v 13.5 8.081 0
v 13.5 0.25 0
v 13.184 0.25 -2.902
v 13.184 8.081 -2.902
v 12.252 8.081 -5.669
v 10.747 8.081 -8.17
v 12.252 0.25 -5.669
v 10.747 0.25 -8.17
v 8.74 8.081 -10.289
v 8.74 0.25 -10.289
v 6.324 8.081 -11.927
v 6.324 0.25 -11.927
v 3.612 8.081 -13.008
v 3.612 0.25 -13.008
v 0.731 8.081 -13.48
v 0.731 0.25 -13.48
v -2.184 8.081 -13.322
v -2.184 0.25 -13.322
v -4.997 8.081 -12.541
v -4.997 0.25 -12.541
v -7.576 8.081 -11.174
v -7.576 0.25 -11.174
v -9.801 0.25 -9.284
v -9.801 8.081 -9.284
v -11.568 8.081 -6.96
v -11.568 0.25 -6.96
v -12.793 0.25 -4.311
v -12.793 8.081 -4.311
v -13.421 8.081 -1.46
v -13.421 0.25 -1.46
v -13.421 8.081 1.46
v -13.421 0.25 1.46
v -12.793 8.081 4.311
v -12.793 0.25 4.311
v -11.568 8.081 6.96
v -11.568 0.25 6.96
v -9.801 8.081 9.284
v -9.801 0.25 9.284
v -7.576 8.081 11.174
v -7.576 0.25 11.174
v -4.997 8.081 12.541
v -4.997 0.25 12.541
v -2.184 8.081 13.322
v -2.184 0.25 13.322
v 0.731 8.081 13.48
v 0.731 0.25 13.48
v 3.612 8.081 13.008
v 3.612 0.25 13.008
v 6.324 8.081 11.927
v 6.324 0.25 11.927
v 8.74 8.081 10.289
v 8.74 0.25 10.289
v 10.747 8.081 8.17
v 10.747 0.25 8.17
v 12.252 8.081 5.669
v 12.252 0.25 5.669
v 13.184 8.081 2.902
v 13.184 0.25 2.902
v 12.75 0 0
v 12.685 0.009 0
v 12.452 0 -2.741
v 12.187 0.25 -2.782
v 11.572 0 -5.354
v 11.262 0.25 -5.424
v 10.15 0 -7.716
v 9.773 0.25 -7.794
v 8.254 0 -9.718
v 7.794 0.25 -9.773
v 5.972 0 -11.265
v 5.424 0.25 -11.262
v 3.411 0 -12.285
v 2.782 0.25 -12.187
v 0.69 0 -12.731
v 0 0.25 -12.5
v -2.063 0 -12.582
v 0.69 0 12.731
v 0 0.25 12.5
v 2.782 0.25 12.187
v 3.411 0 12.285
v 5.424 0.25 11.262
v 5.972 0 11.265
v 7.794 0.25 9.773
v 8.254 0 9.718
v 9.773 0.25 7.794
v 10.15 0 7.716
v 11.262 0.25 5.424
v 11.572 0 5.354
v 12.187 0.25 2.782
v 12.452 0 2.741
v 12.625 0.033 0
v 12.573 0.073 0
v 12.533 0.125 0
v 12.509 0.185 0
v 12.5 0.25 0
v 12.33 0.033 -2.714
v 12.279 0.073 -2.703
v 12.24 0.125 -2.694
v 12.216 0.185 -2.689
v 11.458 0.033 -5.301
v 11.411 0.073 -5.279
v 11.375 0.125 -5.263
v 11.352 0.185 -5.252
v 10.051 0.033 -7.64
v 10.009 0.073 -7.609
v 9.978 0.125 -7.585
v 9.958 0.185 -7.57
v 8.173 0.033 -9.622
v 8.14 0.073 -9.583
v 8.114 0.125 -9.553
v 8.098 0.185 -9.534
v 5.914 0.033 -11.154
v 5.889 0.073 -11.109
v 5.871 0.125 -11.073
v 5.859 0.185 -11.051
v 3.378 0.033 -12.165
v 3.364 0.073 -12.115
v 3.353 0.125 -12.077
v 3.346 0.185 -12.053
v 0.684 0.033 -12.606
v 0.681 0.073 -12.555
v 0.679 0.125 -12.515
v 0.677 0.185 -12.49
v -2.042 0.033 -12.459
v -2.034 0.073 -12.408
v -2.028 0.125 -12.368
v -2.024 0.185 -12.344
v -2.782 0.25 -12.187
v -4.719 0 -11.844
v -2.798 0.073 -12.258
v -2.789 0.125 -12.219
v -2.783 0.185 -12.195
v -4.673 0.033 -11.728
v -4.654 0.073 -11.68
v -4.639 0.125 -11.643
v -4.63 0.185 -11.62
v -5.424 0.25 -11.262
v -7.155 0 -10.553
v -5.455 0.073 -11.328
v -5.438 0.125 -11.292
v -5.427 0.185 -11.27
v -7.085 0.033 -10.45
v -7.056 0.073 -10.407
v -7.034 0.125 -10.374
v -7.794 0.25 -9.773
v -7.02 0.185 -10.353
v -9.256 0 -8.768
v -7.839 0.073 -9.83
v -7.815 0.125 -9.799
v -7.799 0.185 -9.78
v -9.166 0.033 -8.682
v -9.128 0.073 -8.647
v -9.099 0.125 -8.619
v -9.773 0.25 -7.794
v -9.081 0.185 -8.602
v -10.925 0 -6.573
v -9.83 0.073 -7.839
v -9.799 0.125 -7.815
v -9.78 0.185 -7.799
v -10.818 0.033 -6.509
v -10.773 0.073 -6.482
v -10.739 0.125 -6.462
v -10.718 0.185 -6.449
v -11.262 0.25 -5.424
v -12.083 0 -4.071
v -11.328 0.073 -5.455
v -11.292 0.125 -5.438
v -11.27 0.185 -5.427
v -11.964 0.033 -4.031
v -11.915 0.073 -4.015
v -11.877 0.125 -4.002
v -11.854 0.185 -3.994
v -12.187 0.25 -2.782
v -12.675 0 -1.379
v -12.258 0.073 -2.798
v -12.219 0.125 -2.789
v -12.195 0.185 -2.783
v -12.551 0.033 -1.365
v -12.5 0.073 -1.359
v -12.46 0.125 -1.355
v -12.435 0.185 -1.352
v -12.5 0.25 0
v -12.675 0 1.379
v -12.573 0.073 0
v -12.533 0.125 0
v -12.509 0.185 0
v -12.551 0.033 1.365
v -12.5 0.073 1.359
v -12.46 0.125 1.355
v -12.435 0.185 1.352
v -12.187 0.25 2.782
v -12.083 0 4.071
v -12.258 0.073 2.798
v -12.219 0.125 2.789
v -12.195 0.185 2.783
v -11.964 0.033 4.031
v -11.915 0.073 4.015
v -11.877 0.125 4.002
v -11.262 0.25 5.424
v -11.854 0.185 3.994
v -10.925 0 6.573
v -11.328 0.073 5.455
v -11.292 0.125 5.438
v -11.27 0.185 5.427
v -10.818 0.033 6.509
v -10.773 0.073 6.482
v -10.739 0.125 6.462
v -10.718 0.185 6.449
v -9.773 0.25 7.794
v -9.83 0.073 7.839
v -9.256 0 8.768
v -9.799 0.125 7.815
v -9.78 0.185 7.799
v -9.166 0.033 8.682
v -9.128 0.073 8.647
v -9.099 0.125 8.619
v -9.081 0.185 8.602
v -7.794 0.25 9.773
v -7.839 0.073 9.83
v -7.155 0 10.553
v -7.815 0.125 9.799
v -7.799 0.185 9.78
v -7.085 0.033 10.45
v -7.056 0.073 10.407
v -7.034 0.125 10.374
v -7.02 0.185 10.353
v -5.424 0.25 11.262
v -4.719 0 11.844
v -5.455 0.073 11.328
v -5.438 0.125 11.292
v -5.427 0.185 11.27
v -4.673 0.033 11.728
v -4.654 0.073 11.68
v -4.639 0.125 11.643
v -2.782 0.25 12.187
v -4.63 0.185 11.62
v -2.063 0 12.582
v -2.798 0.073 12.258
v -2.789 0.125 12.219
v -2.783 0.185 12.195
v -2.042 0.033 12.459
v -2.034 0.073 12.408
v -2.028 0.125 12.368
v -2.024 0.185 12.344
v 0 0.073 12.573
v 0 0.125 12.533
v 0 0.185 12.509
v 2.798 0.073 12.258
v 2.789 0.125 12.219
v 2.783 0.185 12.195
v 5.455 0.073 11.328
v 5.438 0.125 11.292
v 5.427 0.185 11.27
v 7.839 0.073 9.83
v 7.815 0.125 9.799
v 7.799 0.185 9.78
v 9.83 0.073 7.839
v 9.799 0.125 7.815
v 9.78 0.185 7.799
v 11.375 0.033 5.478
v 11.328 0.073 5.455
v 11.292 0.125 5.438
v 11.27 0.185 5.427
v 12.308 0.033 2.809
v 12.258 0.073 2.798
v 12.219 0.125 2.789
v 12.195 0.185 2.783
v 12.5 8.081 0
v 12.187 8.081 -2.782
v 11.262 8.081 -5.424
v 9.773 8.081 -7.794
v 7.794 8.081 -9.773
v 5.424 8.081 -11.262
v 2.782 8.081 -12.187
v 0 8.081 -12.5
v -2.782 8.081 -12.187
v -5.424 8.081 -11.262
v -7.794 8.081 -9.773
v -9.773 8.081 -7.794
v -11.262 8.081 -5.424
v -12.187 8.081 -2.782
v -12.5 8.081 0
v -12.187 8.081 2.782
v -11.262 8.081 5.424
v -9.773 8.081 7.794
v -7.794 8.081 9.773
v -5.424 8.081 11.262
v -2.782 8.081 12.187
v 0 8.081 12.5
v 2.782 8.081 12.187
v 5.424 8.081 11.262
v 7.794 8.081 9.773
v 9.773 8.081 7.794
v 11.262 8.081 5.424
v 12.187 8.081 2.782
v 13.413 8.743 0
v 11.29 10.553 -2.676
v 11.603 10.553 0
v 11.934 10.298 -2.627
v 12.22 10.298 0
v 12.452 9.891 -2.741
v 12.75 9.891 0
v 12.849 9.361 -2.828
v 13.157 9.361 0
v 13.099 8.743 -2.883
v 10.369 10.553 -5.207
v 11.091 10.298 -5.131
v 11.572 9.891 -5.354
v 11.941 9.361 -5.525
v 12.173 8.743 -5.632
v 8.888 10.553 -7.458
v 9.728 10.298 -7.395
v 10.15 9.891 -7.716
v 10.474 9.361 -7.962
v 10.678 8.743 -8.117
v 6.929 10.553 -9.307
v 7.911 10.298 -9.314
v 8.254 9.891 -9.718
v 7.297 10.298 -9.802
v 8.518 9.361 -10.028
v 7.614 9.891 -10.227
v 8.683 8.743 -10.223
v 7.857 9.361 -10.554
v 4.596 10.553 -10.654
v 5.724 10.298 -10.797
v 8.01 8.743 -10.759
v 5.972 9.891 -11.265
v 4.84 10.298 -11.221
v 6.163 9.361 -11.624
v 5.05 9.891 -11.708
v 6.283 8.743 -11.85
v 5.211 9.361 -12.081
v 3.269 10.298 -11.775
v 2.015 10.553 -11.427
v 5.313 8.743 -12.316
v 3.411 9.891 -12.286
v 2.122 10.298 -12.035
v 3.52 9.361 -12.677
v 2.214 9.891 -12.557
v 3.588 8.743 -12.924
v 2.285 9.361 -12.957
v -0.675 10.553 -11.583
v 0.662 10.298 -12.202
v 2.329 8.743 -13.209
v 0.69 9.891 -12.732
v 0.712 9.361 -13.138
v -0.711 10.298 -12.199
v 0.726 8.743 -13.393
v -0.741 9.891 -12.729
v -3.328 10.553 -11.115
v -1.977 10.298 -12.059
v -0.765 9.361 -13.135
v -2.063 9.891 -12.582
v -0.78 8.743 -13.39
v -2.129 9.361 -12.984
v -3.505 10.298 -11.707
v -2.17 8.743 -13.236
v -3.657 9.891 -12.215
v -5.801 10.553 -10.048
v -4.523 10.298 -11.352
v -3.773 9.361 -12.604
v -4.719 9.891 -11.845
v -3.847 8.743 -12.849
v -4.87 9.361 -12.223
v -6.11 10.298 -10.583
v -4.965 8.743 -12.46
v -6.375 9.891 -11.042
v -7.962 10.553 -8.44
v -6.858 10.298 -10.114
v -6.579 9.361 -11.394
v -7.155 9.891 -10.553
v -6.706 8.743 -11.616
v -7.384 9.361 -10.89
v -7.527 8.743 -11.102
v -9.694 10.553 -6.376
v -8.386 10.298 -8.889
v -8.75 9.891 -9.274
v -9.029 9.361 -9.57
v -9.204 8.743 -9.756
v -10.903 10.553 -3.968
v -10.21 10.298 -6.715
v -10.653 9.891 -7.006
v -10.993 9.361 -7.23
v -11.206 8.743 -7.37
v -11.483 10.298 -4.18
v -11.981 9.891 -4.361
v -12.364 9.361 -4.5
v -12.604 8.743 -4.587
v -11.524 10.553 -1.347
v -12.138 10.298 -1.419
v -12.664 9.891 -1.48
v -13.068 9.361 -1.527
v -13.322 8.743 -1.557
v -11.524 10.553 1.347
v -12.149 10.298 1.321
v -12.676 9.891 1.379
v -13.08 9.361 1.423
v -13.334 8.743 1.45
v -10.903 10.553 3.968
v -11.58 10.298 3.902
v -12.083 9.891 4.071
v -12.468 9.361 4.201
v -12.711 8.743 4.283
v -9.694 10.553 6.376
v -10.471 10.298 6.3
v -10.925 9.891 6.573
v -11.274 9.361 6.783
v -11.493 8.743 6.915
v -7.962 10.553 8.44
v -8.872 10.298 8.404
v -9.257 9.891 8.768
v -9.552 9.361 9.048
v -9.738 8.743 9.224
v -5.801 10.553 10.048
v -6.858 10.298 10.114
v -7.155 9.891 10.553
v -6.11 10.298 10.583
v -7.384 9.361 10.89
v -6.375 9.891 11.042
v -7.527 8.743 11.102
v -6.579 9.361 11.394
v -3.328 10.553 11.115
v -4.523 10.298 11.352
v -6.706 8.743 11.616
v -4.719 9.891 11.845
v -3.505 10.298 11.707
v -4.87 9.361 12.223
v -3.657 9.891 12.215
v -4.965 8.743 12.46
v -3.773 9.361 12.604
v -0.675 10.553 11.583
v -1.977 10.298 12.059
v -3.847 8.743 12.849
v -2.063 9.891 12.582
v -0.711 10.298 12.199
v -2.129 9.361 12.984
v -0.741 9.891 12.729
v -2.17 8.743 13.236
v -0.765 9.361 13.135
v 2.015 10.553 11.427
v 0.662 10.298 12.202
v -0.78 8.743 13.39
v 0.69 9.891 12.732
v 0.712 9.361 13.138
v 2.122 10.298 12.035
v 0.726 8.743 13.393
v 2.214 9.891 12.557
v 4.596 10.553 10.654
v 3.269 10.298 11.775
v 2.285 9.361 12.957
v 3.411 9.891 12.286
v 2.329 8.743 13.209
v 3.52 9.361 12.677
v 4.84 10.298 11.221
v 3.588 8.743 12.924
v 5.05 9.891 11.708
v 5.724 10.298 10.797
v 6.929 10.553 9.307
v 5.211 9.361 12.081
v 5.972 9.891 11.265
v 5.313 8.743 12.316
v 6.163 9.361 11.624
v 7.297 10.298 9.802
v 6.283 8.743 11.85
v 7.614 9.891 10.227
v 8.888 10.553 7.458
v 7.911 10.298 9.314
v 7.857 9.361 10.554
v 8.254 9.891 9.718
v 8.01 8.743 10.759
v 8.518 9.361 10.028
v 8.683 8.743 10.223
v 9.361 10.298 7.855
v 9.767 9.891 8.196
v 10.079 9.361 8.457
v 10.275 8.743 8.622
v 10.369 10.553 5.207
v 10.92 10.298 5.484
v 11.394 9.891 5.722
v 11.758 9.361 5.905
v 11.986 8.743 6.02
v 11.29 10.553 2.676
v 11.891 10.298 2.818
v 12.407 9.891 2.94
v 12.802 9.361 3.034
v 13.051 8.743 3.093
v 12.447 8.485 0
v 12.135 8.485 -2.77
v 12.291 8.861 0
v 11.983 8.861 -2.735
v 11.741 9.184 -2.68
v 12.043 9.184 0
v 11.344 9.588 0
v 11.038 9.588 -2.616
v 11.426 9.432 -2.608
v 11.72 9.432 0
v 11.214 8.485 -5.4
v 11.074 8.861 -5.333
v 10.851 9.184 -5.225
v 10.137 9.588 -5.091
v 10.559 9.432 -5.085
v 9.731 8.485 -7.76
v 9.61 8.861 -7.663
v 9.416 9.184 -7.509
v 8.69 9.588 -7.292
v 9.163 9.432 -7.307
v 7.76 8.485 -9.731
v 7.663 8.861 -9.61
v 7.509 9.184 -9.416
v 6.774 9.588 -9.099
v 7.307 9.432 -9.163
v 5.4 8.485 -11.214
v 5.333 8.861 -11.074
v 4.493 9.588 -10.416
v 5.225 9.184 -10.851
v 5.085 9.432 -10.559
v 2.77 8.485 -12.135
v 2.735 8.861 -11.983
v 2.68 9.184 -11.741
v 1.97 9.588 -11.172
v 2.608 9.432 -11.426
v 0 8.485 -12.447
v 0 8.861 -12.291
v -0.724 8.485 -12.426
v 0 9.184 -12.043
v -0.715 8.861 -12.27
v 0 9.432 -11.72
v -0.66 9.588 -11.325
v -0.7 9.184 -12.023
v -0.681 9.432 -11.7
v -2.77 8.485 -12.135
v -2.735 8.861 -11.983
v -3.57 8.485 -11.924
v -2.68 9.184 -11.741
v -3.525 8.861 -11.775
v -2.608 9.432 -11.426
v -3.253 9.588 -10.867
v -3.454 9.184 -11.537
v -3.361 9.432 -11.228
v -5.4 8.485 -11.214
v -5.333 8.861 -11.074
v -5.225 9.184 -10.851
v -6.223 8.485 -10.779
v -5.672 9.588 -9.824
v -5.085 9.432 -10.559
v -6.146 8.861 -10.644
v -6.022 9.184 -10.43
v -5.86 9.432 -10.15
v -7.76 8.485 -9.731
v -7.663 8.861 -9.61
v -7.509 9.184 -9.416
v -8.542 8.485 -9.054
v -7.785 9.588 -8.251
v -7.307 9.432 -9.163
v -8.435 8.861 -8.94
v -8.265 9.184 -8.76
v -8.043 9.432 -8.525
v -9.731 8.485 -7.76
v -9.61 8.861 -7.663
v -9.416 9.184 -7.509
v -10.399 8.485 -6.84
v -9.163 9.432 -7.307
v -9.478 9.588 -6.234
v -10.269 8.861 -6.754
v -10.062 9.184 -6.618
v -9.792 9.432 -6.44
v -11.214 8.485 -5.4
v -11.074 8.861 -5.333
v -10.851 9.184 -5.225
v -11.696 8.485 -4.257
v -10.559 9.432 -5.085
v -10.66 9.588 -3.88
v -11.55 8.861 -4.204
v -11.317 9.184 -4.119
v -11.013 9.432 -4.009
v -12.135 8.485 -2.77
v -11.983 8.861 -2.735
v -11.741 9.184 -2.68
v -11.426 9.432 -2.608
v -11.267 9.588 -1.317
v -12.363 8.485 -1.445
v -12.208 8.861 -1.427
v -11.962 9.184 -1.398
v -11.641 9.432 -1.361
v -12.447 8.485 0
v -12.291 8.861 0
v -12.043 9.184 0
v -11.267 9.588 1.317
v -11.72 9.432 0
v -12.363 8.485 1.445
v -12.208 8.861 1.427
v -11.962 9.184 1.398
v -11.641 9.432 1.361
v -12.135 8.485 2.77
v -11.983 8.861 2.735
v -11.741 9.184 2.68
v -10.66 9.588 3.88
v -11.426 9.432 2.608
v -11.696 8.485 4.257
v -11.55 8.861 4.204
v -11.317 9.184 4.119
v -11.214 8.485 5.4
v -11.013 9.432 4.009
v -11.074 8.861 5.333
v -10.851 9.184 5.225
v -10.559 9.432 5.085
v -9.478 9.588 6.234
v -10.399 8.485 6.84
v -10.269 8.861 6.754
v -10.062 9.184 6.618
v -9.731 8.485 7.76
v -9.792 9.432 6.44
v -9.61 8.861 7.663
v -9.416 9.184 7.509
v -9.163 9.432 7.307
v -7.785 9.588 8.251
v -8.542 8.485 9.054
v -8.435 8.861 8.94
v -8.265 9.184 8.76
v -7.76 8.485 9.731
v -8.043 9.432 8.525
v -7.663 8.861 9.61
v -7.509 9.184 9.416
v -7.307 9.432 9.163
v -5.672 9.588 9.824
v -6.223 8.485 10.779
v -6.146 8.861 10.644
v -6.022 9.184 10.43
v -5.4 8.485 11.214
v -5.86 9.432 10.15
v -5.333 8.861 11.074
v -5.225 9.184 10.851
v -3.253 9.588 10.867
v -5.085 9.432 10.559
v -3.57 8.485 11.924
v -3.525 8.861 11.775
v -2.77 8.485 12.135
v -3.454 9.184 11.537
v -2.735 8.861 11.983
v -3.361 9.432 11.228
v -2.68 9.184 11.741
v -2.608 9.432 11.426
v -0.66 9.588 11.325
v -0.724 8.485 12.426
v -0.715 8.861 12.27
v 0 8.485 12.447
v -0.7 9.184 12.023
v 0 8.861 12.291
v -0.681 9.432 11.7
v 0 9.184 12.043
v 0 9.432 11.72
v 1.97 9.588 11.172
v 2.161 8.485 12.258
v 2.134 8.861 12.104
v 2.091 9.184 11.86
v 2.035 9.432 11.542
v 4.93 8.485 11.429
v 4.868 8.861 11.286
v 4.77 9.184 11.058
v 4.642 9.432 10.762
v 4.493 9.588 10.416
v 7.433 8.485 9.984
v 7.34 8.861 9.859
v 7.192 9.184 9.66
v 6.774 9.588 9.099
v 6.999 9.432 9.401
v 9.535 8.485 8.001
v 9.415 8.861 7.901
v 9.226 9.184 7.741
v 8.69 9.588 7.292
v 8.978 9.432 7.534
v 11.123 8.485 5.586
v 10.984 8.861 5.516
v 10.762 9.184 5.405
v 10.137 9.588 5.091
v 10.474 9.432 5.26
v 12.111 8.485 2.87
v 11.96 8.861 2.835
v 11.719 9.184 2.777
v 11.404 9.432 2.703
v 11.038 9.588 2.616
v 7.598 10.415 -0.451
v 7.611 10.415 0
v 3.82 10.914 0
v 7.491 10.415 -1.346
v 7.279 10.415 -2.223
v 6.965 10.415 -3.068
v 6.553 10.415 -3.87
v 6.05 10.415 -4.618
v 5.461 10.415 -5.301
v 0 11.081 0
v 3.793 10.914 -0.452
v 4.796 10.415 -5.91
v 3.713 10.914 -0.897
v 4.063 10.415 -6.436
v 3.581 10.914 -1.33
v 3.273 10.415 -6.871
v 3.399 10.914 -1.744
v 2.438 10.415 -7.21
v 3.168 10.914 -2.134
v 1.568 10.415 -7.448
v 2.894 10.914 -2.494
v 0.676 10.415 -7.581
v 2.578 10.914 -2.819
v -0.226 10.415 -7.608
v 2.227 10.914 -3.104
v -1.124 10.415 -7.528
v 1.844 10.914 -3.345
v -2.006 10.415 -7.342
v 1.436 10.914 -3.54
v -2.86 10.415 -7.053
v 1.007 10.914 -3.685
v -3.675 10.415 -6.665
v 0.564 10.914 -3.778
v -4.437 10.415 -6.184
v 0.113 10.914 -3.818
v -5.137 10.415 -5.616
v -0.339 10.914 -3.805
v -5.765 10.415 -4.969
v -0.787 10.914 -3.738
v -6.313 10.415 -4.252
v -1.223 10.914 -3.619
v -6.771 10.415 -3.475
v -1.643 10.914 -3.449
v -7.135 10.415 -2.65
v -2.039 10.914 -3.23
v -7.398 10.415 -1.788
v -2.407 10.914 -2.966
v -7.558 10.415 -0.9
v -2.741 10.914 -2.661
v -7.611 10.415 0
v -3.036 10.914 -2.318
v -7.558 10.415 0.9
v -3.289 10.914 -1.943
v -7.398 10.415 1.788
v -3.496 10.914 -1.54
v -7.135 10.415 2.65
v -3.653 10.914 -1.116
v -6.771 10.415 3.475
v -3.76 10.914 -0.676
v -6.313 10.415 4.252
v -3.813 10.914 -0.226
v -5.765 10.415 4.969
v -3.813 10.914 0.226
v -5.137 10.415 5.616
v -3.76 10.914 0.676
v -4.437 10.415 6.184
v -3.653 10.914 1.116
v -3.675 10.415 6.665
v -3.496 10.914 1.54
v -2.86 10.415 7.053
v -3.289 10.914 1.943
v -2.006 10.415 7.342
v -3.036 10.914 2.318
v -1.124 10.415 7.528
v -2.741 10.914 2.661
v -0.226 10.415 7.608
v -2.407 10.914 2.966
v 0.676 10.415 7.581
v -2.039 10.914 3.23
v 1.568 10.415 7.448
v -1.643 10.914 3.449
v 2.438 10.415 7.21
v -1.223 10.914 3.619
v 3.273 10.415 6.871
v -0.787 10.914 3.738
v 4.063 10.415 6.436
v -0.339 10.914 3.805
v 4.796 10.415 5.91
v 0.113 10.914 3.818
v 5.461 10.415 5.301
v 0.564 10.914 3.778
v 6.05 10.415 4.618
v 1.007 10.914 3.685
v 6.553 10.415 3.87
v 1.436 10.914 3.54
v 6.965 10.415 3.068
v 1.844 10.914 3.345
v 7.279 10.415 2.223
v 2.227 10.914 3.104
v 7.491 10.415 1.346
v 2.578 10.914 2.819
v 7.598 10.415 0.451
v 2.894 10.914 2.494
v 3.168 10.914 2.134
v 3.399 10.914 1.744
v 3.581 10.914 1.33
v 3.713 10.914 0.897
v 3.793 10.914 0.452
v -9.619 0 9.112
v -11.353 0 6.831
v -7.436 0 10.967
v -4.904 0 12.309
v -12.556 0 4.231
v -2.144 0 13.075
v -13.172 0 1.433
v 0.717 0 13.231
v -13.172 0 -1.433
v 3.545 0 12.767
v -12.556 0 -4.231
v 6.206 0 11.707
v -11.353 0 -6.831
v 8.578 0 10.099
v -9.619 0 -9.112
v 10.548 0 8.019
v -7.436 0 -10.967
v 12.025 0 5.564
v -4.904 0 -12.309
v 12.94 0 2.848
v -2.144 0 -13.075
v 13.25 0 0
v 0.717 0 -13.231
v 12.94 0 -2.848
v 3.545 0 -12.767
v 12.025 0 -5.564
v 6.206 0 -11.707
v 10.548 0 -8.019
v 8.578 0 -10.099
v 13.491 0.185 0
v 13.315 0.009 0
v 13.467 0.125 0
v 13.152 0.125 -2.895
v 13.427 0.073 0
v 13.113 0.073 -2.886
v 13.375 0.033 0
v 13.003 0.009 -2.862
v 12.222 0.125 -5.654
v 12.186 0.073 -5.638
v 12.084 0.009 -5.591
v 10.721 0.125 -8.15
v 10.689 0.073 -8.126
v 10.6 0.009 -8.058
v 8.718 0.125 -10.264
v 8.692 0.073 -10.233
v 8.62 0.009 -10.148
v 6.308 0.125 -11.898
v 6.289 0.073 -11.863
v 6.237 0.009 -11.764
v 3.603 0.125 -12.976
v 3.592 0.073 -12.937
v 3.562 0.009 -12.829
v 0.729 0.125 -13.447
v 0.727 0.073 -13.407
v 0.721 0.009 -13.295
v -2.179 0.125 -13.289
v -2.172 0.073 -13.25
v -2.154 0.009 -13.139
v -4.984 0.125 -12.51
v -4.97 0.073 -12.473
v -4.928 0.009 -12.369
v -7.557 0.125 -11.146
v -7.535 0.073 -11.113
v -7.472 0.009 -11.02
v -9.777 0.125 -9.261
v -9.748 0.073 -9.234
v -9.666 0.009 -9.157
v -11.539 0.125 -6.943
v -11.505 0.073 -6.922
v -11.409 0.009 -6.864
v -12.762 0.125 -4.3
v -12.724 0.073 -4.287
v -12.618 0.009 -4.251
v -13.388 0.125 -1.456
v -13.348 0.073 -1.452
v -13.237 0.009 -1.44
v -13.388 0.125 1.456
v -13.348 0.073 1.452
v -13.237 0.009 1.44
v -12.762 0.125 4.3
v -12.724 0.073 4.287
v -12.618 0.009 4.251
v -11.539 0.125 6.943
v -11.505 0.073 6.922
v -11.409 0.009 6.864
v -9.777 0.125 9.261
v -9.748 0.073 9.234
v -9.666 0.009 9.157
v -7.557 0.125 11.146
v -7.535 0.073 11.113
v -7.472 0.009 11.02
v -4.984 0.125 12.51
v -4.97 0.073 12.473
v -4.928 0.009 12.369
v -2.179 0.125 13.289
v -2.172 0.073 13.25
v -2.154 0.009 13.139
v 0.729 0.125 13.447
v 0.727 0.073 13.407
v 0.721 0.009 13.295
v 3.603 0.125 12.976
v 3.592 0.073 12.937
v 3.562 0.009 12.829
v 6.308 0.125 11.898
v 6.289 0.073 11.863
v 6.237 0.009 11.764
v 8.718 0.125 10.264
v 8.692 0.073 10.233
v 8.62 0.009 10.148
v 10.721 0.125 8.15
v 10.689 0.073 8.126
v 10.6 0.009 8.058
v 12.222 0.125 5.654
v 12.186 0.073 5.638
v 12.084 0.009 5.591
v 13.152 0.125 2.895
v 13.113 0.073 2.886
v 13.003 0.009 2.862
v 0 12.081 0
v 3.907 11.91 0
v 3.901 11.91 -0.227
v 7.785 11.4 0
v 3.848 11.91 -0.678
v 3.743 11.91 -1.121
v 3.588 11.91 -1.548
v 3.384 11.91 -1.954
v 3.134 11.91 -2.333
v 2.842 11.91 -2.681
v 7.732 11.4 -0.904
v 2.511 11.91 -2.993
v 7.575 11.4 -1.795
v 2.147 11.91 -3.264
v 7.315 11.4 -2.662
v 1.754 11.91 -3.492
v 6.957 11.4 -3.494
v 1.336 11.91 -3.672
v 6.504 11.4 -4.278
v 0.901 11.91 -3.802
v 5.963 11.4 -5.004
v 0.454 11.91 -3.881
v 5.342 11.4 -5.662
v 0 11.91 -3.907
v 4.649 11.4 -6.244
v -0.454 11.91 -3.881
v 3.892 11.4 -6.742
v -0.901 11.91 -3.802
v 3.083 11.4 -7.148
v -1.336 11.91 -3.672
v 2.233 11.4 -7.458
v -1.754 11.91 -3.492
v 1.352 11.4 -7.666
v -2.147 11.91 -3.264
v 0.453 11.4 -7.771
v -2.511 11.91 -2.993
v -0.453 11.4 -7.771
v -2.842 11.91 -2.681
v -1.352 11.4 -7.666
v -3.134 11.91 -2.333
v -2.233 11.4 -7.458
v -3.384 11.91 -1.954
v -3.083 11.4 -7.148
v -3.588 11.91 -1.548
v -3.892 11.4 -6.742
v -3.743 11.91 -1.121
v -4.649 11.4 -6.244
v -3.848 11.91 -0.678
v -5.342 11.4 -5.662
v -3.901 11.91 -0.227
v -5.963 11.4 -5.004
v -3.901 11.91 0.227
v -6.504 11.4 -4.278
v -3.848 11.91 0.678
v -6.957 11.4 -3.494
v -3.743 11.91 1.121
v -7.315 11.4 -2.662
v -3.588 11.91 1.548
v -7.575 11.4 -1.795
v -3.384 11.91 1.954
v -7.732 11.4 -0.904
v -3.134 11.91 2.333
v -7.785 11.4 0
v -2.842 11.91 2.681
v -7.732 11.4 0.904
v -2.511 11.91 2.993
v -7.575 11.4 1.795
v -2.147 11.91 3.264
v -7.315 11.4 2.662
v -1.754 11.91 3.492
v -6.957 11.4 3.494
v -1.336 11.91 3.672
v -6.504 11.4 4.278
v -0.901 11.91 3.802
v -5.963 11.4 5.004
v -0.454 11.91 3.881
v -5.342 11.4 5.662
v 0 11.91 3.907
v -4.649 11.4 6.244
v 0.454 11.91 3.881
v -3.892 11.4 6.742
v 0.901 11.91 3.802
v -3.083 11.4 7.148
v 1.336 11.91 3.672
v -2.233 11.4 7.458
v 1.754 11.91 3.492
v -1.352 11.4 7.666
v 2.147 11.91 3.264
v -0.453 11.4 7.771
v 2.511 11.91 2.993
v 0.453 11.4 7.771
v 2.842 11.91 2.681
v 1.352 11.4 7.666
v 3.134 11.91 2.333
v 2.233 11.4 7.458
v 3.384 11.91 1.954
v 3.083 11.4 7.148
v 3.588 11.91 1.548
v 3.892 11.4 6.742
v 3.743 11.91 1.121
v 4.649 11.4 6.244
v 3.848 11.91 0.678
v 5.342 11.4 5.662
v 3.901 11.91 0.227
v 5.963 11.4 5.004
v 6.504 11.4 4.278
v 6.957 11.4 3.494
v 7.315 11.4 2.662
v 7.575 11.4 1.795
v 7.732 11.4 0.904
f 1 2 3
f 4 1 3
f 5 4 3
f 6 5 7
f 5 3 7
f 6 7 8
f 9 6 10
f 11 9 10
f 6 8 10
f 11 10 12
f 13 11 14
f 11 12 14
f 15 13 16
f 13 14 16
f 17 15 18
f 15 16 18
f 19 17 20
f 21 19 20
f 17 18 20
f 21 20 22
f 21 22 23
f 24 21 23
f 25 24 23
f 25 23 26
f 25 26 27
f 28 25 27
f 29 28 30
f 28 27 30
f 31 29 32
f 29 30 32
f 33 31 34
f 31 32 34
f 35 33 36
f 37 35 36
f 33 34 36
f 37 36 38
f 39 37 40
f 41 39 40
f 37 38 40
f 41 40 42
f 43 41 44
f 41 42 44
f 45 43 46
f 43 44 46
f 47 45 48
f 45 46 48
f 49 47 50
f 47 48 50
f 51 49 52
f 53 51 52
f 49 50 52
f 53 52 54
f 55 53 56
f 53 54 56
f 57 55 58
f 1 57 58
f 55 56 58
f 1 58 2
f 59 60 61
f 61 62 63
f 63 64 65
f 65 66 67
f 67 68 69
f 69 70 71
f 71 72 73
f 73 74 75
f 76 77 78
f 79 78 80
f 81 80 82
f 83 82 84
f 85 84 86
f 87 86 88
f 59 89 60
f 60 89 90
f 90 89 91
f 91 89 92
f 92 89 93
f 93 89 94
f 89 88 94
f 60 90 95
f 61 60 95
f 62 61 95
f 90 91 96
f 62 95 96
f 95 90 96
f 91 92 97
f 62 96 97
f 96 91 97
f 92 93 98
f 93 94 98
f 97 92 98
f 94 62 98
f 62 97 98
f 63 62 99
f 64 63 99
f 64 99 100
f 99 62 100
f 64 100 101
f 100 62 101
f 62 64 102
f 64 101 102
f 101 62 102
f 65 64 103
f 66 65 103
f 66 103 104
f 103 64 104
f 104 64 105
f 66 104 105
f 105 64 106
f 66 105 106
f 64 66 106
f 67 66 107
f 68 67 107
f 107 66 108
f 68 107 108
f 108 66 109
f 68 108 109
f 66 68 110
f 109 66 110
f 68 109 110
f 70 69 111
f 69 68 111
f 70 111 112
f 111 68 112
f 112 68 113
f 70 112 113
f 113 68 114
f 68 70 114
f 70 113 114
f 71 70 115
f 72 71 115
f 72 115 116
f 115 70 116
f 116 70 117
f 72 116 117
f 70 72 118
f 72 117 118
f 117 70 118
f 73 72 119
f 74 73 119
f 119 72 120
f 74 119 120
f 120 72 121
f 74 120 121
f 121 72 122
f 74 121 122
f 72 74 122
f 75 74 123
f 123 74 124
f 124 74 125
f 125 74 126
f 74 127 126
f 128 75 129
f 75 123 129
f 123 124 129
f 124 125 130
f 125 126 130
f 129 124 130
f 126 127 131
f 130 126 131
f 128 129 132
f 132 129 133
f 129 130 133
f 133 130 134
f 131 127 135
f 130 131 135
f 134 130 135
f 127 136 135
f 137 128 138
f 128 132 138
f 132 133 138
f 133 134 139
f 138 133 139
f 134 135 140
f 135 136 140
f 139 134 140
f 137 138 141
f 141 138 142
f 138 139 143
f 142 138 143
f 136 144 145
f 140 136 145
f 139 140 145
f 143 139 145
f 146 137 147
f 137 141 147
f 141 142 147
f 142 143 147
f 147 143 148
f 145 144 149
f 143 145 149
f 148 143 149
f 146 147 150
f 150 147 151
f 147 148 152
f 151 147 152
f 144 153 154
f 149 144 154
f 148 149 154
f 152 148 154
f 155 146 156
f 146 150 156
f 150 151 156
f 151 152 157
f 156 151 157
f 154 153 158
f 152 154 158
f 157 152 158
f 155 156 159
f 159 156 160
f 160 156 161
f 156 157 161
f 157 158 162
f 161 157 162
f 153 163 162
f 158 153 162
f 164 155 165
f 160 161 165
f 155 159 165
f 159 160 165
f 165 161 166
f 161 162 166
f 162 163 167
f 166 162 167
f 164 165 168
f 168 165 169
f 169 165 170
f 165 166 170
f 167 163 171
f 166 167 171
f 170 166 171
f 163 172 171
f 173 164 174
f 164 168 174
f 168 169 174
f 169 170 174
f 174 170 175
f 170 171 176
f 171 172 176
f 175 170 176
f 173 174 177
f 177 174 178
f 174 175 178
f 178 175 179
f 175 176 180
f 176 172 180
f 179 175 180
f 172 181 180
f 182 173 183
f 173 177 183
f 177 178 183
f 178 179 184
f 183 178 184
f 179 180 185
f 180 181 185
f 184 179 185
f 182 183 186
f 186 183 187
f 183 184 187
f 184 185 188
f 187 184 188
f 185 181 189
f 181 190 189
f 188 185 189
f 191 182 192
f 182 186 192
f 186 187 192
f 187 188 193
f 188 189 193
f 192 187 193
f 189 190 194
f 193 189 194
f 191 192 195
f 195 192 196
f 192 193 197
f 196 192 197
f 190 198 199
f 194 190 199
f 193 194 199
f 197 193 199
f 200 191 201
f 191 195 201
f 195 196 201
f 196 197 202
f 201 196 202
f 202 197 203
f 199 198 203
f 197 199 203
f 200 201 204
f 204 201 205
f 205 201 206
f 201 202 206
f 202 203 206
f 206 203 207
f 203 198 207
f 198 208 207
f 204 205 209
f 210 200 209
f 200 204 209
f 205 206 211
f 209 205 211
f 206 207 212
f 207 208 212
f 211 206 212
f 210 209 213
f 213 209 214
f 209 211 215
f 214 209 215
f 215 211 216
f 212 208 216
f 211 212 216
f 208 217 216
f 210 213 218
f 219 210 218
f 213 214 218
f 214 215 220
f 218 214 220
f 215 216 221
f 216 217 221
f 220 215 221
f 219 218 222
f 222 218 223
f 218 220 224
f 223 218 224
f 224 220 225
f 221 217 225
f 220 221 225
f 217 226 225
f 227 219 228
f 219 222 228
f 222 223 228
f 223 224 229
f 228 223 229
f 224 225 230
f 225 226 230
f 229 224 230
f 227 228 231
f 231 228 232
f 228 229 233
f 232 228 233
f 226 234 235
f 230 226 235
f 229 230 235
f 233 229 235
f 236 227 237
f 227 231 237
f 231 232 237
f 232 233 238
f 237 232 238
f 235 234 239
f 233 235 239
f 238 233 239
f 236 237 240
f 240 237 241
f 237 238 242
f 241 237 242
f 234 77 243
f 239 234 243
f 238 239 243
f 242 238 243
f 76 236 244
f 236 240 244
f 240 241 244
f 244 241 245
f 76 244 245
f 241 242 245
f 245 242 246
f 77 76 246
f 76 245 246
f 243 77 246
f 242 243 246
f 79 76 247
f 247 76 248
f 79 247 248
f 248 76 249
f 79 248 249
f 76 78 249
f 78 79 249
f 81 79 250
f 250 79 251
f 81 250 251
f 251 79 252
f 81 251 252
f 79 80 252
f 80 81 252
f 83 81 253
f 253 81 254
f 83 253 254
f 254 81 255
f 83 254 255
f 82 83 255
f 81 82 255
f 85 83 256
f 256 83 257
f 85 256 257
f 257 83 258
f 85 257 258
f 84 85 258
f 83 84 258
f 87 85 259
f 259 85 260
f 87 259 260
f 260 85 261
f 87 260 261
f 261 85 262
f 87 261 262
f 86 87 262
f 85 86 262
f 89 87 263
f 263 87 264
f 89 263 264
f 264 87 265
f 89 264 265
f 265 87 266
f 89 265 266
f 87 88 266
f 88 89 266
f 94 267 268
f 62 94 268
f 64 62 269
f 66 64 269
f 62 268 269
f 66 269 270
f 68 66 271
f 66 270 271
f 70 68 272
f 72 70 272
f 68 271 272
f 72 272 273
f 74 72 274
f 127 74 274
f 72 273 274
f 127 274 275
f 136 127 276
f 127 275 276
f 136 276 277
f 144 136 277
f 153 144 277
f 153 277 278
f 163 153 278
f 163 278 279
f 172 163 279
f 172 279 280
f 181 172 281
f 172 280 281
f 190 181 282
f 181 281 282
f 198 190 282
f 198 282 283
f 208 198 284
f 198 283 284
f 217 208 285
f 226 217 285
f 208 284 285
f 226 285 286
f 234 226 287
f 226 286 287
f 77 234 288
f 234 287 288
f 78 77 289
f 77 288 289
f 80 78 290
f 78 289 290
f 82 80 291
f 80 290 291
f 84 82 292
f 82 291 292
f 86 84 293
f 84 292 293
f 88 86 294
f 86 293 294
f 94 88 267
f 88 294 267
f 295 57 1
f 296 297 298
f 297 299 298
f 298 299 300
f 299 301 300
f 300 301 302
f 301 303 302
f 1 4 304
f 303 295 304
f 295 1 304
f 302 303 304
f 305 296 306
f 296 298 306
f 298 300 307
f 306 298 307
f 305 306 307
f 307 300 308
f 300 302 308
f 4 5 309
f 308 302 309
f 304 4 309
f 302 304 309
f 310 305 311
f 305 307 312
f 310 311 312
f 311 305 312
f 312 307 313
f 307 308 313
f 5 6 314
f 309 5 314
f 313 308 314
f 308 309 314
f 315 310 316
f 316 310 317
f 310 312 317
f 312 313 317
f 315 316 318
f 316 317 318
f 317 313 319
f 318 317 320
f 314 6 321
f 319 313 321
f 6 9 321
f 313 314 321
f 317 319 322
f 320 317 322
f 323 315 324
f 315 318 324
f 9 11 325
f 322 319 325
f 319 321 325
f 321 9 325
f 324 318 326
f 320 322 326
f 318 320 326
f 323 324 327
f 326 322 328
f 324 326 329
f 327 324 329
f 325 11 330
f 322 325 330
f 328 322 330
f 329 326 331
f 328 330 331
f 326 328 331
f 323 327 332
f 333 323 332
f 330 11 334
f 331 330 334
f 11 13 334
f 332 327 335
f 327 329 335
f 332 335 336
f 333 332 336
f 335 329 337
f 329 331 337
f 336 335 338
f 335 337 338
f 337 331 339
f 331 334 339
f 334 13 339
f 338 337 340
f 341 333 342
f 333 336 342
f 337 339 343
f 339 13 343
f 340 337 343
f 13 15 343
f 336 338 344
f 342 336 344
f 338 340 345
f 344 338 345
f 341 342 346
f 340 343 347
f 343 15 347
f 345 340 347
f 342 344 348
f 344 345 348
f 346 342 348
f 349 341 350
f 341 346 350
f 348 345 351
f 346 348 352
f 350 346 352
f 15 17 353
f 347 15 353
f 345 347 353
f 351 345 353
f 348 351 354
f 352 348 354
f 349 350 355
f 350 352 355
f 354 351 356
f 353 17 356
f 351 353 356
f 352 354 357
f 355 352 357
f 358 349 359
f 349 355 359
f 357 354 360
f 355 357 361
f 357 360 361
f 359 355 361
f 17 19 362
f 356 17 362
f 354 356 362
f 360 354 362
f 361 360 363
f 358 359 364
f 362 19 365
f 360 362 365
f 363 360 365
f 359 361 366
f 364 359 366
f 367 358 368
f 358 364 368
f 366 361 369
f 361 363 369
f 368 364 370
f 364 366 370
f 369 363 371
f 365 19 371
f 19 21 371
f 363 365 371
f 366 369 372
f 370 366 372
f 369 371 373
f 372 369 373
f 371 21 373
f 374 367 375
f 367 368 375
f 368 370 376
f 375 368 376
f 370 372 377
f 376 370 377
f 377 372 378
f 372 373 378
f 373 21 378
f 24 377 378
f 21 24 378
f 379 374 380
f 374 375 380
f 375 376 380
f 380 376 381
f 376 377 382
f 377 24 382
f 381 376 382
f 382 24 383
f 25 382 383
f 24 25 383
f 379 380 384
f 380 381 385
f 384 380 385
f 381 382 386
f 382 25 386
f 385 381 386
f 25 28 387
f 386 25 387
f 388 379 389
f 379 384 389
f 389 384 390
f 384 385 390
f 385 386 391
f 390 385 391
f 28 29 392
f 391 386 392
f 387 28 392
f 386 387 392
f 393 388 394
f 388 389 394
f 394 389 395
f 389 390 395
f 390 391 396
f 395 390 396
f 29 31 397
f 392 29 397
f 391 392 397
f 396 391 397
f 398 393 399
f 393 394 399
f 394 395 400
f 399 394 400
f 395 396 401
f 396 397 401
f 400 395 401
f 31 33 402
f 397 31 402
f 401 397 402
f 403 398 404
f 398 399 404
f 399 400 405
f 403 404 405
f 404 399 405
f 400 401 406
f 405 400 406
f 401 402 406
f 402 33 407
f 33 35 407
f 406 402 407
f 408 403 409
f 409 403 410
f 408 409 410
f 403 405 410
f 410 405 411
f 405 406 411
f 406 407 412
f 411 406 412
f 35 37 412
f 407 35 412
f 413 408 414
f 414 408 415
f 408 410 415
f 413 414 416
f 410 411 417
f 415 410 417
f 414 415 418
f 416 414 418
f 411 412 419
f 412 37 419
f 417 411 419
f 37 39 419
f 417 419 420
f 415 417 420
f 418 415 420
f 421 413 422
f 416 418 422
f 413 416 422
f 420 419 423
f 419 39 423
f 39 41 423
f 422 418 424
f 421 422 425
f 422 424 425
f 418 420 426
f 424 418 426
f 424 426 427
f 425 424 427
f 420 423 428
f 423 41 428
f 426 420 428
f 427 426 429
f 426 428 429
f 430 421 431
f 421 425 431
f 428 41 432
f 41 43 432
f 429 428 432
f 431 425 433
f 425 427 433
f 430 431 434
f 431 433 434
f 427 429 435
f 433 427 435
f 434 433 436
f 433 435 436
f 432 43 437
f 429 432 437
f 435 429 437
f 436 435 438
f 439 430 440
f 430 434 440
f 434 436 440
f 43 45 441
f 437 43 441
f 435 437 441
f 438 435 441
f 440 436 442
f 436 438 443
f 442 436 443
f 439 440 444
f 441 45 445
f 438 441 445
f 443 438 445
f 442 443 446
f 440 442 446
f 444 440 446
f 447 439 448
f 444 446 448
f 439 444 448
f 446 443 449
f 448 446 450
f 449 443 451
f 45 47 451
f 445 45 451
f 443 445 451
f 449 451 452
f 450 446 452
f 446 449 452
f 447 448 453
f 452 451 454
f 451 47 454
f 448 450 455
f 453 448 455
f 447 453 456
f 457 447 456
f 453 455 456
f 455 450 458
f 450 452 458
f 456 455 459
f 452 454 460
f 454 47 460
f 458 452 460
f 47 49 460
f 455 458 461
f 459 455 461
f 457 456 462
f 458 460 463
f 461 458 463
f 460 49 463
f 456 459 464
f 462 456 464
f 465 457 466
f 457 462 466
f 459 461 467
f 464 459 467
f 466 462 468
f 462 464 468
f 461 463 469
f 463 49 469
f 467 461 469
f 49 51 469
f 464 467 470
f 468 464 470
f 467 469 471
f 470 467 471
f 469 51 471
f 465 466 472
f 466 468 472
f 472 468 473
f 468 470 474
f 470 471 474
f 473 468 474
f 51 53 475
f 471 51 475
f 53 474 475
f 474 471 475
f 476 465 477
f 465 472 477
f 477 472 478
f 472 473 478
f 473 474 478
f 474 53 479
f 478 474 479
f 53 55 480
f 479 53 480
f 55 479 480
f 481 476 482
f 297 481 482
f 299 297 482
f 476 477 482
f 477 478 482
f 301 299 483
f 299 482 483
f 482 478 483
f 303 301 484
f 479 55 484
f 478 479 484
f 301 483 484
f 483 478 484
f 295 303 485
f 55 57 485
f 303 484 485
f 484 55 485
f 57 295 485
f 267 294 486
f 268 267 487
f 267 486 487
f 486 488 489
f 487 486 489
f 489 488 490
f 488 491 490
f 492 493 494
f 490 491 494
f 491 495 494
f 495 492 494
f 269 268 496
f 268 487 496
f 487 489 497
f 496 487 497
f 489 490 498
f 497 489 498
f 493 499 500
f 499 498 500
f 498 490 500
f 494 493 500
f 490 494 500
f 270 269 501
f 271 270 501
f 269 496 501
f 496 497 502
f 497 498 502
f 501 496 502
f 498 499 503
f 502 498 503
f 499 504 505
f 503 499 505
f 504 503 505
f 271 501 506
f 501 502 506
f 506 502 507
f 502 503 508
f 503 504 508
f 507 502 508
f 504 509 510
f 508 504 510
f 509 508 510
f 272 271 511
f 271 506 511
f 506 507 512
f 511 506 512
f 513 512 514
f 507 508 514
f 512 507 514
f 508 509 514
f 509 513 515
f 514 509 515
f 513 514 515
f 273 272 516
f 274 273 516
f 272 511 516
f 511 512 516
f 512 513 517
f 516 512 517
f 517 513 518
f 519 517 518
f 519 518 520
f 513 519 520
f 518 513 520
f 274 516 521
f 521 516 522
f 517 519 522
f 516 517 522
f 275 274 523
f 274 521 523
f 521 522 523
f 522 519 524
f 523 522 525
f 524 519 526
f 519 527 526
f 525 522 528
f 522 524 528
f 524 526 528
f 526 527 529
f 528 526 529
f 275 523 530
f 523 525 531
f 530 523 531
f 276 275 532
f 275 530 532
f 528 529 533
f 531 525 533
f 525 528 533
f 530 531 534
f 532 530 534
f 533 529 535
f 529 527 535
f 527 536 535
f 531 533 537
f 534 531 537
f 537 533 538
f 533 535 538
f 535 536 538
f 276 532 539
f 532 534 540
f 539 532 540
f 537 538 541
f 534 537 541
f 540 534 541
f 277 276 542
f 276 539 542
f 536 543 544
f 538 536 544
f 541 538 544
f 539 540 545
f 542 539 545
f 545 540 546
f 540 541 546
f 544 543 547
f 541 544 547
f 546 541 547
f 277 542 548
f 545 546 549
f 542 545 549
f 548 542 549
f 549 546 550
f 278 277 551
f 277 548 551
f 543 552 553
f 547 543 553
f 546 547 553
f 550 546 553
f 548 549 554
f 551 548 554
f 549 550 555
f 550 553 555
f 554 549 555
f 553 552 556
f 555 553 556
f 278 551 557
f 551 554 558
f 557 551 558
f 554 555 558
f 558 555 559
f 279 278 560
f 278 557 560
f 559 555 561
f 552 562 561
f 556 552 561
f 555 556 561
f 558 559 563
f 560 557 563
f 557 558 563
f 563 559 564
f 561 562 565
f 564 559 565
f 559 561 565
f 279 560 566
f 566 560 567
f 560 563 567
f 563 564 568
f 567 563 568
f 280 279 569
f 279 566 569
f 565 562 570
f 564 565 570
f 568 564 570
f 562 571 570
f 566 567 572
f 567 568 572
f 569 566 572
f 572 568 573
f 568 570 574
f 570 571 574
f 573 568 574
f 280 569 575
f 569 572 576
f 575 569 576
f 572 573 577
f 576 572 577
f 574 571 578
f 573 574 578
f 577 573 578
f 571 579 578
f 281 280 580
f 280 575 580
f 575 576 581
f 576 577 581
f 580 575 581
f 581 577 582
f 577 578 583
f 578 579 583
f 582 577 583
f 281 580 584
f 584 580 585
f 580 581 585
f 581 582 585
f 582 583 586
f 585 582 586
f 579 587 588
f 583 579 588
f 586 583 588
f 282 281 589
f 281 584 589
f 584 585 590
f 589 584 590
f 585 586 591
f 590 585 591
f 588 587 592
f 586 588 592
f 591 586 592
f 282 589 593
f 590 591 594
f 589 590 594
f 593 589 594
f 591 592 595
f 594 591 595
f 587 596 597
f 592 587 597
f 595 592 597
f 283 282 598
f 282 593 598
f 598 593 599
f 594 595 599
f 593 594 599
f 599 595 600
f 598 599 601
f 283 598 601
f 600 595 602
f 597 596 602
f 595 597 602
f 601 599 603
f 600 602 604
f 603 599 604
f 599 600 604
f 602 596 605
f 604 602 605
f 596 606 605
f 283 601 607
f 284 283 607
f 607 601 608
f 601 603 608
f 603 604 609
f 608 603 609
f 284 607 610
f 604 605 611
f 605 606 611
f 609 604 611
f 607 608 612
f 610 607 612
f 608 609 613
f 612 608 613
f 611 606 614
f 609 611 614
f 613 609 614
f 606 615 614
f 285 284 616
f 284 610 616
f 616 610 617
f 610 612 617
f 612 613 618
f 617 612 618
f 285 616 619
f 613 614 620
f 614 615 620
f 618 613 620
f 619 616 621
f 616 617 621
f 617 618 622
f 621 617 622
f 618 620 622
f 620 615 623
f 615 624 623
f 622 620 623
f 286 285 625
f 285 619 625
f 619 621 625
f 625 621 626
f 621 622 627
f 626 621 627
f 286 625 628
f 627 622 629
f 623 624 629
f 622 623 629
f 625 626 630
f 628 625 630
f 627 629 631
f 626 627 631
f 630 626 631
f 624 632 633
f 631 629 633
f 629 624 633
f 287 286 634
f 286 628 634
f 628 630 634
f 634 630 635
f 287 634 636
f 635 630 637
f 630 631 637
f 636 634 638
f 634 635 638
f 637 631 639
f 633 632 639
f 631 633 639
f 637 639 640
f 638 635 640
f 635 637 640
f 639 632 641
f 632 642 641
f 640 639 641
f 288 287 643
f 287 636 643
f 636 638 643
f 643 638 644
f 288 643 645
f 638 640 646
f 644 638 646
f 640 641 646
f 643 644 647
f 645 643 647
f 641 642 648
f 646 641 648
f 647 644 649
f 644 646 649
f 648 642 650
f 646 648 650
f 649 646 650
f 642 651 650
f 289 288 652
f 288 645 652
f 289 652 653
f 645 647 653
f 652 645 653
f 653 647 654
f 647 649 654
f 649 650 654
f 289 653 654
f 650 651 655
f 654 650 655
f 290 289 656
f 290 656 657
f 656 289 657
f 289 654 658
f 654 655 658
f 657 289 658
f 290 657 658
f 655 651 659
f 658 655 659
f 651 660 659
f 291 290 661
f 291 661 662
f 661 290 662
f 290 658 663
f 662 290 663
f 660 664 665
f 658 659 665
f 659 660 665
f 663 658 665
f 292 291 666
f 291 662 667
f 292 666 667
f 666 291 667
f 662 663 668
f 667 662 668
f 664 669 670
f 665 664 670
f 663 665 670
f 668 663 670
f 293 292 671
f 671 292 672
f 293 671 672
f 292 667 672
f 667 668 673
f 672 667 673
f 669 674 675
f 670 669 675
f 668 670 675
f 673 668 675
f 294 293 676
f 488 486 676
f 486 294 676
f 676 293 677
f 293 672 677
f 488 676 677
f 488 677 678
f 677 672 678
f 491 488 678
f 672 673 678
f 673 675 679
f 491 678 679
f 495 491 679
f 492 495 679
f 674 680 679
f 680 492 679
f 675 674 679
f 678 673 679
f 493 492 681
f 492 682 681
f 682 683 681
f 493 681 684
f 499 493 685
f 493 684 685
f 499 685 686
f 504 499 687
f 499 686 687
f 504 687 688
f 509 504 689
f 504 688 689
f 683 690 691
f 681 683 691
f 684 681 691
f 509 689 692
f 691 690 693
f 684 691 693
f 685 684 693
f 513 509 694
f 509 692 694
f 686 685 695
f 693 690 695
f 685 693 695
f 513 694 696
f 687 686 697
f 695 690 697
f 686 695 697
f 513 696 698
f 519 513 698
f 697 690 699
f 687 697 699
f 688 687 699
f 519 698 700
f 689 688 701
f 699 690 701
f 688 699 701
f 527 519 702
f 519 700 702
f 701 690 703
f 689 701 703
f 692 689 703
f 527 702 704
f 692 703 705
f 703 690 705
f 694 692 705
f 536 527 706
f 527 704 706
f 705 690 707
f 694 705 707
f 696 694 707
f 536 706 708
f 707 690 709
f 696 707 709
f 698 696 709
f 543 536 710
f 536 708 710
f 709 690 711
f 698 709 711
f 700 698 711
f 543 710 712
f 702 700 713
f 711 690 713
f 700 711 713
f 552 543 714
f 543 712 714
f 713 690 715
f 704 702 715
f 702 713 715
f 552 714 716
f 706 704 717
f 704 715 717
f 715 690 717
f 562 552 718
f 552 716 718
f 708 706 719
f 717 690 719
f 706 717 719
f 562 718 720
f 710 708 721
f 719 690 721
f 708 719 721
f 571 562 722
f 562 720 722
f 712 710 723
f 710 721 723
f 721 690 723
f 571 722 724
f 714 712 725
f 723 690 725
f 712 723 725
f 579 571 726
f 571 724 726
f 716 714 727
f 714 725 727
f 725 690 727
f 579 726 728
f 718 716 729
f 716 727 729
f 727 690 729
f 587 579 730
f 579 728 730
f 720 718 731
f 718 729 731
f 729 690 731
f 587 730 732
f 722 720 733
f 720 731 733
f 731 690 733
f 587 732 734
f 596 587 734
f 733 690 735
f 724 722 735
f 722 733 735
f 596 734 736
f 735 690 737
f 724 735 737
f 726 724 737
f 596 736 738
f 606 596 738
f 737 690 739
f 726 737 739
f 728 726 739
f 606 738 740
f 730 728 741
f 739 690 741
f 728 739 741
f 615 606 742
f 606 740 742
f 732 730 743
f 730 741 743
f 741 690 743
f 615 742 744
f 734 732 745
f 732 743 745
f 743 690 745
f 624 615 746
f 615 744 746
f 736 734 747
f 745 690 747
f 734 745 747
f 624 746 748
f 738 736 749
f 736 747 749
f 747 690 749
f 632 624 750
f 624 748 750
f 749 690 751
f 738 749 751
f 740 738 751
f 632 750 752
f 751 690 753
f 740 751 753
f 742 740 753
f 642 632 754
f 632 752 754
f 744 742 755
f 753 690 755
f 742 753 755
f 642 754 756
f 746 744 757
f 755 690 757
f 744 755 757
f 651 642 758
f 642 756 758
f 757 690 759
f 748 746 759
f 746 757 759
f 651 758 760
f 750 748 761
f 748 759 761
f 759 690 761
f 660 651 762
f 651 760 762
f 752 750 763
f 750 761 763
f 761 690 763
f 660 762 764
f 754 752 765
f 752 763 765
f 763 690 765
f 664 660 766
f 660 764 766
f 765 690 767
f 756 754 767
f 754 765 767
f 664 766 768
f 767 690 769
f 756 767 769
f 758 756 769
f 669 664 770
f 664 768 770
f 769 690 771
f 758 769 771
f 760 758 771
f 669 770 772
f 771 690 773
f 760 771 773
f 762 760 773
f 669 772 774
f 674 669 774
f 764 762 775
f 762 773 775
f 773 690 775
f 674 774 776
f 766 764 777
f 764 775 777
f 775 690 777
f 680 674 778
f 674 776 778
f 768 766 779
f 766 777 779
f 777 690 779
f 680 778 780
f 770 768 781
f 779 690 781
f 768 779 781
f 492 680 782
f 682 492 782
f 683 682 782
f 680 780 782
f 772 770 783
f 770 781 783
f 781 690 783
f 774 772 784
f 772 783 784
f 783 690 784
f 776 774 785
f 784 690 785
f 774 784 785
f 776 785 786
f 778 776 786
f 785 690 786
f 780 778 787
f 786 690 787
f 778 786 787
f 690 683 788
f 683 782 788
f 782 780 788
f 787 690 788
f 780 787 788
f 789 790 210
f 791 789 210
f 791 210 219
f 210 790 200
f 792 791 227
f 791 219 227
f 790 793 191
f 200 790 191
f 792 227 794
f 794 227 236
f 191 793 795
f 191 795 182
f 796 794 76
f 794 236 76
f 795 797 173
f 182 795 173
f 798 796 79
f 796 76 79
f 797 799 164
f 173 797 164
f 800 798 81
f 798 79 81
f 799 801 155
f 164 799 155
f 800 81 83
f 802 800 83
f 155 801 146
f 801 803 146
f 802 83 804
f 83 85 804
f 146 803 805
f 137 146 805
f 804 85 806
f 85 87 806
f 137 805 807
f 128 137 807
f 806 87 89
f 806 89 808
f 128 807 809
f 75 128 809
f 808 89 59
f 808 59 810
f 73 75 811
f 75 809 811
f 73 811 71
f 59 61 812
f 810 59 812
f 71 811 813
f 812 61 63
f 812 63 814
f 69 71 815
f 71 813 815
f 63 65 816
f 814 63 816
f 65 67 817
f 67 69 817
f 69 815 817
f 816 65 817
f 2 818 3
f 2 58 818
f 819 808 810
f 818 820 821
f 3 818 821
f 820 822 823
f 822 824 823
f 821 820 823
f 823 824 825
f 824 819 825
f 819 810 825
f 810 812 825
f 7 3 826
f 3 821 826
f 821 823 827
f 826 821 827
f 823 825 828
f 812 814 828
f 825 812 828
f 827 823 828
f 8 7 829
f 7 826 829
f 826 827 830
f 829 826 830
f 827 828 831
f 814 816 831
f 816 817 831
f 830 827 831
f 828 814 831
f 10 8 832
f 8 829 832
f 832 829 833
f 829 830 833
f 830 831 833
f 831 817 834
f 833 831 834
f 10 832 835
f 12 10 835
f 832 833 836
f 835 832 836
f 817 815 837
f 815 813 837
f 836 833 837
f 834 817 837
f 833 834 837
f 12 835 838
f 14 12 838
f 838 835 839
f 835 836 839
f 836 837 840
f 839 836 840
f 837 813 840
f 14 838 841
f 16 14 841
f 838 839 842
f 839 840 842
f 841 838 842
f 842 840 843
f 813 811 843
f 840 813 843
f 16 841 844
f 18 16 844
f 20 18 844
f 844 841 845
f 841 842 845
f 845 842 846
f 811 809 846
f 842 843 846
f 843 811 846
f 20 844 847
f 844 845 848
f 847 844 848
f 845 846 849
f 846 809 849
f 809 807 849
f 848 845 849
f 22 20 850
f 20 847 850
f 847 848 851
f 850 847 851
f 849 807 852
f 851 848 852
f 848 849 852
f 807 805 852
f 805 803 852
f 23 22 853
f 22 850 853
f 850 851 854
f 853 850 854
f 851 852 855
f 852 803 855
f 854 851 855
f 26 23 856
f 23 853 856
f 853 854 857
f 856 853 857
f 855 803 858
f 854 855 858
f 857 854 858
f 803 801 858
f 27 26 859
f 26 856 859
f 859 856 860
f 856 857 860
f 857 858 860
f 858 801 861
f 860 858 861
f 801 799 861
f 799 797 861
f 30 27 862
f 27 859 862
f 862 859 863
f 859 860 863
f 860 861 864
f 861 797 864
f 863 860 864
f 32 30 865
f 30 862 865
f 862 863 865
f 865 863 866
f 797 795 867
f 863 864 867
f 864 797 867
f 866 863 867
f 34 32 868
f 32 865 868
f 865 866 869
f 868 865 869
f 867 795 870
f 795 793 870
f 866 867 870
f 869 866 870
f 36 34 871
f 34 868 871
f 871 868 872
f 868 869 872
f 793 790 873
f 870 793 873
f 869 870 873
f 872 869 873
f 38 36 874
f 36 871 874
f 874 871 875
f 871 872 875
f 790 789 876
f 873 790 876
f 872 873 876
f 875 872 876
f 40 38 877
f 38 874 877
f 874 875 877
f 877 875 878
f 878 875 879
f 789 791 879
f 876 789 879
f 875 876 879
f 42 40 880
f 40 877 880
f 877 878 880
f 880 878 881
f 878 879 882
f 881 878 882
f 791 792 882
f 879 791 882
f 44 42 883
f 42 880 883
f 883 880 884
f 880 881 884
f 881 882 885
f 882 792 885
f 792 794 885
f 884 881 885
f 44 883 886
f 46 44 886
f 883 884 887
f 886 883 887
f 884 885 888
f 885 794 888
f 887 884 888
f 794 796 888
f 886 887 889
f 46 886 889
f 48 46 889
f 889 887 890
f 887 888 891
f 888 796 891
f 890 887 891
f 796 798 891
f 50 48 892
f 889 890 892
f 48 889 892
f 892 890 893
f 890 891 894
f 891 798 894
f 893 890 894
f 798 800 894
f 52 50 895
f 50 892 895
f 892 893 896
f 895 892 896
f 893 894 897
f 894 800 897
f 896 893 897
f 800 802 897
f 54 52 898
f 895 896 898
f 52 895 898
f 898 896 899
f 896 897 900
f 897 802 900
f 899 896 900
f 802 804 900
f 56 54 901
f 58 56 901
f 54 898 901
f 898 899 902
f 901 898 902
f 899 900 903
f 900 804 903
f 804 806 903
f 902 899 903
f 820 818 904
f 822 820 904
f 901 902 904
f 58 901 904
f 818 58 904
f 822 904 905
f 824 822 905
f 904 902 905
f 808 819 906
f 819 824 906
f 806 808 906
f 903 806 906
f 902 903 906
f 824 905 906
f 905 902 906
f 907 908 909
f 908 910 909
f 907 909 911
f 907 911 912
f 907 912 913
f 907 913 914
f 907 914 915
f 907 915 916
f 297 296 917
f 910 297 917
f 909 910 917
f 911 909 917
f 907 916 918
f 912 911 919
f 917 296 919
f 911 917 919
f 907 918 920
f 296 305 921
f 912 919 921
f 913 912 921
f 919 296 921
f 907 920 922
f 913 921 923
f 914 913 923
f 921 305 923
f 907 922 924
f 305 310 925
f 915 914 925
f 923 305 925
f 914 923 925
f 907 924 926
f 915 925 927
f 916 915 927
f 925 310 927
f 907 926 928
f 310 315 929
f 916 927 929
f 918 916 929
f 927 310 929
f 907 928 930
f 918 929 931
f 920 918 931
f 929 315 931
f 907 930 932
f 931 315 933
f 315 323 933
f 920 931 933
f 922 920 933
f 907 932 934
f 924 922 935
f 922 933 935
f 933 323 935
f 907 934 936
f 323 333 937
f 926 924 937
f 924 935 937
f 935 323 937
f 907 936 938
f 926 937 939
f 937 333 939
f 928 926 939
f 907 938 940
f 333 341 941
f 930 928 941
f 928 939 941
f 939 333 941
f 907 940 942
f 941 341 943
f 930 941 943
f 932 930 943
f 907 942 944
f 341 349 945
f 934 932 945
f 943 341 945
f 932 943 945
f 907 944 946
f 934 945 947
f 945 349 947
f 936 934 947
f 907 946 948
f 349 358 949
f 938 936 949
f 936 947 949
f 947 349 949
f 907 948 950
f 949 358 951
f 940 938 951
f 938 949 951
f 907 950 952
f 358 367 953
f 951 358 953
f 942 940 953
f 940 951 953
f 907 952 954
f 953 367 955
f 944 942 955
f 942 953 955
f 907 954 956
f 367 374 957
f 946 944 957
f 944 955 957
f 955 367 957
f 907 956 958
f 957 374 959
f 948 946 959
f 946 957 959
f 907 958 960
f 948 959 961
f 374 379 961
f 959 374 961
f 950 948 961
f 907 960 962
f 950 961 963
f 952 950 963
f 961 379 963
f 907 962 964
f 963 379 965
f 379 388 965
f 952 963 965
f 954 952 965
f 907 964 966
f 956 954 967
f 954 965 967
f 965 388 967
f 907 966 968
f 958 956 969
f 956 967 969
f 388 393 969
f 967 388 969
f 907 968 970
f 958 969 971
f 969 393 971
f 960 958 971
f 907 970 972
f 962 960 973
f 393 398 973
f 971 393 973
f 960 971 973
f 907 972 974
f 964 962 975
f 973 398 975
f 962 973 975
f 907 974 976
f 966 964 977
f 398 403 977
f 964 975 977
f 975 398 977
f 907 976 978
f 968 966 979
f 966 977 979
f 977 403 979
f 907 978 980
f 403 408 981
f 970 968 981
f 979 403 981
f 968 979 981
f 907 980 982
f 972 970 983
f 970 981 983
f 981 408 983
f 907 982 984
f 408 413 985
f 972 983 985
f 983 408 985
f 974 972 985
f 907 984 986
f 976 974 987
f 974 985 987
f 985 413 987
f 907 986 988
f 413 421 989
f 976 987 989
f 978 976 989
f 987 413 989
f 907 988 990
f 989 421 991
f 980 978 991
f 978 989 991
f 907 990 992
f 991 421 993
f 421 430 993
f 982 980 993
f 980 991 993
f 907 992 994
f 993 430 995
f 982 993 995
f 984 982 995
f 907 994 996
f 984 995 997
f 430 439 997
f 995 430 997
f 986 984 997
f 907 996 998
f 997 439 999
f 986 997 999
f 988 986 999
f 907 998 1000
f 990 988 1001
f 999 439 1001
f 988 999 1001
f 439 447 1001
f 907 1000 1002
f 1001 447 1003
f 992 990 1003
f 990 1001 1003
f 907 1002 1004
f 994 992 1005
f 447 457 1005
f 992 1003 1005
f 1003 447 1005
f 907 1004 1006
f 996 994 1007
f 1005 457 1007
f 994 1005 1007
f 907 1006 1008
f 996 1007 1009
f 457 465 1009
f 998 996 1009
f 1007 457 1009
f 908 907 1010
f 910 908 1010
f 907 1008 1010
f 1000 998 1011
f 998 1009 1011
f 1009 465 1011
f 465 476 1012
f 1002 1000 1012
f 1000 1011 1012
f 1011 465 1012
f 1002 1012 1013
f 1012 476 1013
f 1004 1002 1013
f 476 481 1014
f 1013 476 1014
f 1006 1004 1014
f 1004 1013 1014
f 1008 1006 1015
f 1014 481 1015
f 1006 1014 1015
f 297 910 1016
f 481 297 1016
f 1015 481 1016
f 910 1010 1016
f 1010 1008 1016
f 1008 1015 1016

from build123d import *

# Parameters (mm, degrees)
FILLET1_R = 0.25


with BuildPart() as part:
    # Sketch1 → Revolve1 (revolve)
    with BuildSketch(Plane.XY):
        with BuildLine():
            Line((13.5, 8.080985965), (13.5, 0))
            Line((13.5, 0), (12.5, 0))
            Line((12.5, 0), (12.5, 8.080985965))
            ThreePointArc((12.5, 8.080985965), (12.177697445, 9.030458674), (11.343995274, 9.587520655))
            ThreePointArc((11.343995274, 9.587520655), (5.720941081, 10.706015676), (0, 11.080985965))
            Line((0, 11.080985965), (0, 12.080985965))
            ThreePointArc((0, 12.080985965), (5.851467273, 11.697460538), (11.60281432, 10.553446481))
            ThreePointArc((11.60281432, 10.553446481), (12.971050786, 9.639220103), (13.5, 8.080985965))
        make_face()
    revolve(axis=Axis((0, -281.832551031, 0), (0, 1, 0)))

    # Fillet1
    fillet1_edges = [part.edges().sort_by_distance(p)[0] for p in [
        (-13.5, 0, 0),
        (-12.5, 0, 0),
    ]]
    fillet(fillet1_edges, radius=FILLET1_R)


solid = part.part
